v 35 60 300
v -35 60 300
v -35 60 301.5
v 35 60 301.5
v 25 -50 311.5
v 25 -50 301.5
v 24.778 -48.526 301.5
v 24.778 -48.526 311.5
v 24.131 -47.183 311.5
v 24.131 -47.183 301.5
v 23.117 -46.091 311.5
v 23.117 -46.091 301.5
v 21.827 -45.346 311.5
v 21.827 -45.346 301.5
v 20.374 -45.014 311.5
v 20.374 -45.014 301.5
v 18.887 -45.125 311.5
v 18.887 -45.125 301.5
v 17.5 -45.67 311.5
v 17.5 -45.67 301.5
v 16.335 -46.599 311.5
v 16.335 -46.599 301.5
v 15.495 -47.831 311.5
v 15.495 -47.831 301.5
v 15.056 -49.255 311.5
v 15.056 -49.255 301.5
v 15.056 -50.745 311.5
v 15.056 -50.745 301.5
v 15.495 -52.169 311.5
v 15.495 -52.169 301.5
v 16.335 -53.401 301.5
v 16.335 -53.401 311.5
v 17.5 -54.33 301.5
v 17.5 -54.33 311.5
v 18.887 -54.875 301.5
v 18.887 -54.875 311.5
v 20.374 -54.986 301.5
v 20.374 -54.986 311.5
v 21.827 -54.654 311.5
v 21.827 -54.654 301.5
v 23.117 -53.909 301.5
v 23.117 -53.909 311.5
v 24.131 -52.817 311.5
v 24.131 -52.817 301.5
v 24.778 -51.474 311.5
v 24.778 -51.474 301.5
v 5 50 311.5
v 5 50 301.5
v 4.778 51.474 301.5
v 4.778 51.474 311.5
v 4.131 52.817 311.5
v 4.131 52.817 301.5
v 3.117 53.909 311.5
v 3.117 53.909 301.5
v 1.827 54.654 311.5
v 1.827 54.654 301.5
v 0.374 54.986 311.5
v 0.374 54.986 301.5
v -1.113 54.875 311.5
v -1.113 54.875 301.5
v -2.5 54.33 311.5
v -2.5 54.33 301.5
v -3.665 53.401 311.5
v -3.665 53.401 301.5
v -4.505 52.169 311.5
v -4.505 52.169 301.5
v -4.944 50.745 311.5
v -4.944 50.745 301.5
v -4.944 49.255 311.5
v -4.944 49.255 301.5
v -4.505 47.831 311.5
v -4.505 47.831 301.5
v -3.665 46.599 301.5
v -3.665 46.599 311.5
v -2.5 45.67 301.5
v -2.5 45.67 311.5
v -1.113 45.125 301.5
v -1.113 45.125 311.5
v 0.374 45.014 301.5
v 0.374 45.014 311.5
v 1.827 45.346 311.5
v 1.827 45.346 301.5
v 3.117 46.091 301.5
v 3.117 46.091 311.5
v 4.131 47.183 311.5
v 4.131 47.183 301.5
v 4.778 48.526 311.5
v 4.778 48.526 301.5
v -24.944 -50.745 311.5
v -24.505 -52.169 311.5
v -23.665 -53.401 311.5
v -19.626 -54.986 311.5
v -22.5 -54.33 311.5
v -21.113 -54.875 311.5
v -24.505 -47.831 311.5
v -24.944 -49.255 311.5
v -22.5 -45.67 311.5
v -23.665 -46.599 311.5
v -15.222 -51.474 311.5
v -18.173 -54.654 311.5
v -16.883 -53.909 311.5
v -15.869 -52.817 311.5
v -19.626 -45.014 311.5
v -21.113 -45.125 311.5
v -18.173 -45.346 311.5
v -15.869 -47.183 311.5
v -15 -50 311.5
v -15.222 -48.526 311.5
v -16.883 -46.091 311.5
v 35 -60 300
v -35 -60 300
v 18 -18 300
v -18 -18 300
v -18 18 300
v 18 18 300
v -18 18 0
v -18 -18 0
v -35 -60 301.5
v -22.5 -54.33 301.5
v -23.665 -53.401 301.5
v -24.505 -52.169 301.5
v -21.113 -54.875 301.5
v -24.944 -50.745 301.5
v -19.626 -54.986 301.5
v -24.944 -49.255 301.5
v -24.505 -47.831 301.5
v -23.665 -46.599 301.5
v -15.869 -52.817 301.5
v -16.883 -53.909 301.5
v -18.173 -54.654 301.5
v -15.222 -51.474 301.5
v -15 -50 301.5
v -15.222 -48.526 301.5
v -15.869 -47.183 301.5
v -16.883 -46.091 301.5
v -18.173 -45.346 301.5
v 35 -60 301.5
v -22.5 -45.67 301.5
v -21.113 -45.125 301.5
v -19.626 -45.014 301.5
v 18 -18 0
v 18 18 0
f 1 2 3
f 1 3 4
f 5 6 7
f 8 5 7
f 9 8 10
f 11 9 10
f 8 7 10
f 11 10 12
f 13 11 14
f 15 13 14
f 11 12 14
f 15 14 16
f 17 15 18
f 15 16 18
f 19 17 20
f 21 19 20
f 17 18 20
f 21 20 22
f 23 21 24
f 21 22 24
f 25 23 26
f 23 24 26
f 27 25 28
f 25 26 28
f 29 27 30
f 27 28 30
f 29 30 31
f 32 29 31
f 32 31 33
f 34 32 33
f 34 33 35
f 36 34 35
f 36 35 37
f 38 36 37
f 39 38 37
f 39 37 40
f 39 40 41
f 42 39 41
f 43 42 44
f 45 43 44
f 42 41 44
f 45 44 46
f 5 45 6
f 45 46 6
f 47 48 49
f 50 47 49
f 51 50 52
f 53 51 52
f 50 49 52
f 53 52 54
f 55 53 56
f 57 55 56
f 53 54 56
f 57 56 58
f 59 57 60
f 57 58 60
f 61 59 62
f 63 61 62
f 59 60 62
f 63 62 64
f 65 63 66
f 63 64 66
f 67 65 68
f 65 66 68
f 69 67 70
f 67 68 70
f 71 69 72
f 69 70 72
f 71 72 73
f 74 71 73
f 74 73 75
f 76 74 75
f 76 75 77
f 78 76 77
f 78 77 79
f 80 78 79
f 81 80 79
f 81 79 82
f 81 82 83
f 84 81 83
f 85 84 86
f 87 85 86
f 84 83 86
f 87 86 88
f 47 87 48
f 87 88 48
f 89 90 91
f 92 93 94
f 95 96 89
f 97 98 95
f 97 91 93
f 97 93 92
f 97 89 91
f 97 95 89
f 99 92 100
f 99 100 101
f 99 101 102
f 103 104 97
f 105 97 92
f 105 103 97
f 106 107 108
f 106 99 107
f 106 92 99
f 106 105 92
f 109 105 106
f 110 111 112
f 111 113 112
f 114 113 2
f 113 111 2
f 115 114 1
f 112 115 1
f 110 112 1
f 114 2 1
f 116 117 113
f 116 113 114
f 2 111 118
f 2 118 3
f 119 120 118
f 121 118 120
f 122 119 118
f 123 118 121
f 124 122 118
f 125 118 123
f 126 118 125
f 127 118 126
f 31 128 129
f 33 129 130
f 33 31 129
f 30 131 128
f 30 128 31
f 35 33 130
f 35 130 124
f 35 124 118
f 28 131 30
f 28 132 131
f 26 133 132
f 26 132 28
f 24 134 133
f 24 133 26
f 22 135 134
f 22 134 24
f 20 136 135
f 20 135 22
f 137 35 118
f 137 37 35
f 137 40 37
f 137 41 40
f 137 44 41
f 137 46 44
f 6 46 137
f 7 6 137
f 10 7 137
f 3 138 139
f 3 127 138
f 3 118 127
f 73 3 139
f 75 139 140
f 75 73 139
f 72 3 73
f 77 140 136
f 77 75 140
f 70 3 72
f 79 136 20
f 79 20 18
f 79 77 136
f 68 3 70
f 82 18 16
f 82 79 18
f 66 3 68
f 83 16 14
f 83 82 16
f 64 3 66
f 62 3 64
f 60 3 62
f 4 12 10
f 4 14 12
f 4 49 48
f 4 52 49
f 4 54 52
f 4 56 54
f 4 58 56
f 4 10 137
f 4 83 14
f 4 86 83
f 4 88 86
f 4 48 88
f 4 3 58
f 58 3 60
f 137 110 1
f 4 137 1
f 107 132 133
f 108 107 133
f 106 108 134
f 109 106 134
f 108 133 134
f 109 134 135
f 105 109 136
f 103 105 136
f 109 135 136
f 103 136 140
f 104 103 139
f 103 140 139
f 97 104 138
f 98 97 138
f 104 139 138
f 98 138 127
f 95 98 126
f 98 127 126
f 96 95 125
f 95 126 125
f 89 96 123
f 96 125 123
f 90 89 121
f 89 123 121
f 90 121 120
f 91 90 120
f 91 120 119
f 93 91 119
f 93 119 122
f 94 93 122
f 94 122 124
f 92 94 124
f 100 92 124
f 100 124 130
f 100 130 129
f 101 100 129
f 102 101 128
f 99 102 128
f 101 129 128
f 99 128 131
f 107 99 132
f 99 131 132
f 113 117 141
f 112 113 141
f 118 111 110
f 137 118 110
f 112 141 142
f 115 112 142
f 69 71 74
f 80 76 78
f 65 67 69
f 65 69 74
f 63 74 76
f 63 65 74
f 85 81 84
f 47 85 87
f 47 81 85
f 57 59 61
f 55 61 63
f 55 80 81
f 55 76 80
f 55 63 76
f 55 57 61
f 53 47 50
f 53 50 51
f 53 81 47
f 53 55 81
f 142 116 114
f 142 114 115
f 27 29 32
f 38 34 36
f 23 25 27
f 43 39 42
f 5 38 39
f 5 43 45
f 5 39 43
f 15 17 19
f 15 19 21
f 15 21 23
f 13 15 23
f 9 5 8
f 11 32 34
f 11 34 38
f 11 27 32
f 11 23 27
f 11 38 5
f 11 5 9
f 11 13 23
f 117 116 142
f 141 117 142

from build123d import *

# Parameters (mm, degrees)
SKETCH1_W           = 36
SKETCH1_H           = 36
BOSS_EXTRUDE1_DEPTH = 300
SKETCH2_W           = 70
SKETCH2_H           = 120
BOSS_EXTRUDE2_DEPTH = 1.5
SKETCH3_R           = 5
BOSS_EXTRUDE3_DEPTH = 10


with BuildPart() as part:
    # Sketch1 → Boss-Extrude1 (new body)
    with BuildSketch(Plane.XY):
        Rectangle(SKETCH1_W, SKETCH1_H)
    extrude(amount=BOSS_EXTRUDE1_DEPTH)

    # Sketch2 → Boss-Extrude2 (add)
    with BuildSketch(Plane.XY.offset(300)):
        Rectangle(SKETCH2_W, SKETCH2_H)
    extrude(amount=BOSS_EXTRUDE2_DEPTH)

    # Sketch3 → Boss-Extrude3 (add)
    with BuildSketch(Plane.XY.offset(301.5)):
        with Locations((0, 50)):
            Circle(SKETCH3_R)
        with Locations((-20, -50)):
            Circle(SKETCH3_R)
        with Locations((20, -50)):
            Circle(SKETCH3_R)
    extrude(amount=BOSS_EXTRUDE3_DEPTH)


solid = part.part
